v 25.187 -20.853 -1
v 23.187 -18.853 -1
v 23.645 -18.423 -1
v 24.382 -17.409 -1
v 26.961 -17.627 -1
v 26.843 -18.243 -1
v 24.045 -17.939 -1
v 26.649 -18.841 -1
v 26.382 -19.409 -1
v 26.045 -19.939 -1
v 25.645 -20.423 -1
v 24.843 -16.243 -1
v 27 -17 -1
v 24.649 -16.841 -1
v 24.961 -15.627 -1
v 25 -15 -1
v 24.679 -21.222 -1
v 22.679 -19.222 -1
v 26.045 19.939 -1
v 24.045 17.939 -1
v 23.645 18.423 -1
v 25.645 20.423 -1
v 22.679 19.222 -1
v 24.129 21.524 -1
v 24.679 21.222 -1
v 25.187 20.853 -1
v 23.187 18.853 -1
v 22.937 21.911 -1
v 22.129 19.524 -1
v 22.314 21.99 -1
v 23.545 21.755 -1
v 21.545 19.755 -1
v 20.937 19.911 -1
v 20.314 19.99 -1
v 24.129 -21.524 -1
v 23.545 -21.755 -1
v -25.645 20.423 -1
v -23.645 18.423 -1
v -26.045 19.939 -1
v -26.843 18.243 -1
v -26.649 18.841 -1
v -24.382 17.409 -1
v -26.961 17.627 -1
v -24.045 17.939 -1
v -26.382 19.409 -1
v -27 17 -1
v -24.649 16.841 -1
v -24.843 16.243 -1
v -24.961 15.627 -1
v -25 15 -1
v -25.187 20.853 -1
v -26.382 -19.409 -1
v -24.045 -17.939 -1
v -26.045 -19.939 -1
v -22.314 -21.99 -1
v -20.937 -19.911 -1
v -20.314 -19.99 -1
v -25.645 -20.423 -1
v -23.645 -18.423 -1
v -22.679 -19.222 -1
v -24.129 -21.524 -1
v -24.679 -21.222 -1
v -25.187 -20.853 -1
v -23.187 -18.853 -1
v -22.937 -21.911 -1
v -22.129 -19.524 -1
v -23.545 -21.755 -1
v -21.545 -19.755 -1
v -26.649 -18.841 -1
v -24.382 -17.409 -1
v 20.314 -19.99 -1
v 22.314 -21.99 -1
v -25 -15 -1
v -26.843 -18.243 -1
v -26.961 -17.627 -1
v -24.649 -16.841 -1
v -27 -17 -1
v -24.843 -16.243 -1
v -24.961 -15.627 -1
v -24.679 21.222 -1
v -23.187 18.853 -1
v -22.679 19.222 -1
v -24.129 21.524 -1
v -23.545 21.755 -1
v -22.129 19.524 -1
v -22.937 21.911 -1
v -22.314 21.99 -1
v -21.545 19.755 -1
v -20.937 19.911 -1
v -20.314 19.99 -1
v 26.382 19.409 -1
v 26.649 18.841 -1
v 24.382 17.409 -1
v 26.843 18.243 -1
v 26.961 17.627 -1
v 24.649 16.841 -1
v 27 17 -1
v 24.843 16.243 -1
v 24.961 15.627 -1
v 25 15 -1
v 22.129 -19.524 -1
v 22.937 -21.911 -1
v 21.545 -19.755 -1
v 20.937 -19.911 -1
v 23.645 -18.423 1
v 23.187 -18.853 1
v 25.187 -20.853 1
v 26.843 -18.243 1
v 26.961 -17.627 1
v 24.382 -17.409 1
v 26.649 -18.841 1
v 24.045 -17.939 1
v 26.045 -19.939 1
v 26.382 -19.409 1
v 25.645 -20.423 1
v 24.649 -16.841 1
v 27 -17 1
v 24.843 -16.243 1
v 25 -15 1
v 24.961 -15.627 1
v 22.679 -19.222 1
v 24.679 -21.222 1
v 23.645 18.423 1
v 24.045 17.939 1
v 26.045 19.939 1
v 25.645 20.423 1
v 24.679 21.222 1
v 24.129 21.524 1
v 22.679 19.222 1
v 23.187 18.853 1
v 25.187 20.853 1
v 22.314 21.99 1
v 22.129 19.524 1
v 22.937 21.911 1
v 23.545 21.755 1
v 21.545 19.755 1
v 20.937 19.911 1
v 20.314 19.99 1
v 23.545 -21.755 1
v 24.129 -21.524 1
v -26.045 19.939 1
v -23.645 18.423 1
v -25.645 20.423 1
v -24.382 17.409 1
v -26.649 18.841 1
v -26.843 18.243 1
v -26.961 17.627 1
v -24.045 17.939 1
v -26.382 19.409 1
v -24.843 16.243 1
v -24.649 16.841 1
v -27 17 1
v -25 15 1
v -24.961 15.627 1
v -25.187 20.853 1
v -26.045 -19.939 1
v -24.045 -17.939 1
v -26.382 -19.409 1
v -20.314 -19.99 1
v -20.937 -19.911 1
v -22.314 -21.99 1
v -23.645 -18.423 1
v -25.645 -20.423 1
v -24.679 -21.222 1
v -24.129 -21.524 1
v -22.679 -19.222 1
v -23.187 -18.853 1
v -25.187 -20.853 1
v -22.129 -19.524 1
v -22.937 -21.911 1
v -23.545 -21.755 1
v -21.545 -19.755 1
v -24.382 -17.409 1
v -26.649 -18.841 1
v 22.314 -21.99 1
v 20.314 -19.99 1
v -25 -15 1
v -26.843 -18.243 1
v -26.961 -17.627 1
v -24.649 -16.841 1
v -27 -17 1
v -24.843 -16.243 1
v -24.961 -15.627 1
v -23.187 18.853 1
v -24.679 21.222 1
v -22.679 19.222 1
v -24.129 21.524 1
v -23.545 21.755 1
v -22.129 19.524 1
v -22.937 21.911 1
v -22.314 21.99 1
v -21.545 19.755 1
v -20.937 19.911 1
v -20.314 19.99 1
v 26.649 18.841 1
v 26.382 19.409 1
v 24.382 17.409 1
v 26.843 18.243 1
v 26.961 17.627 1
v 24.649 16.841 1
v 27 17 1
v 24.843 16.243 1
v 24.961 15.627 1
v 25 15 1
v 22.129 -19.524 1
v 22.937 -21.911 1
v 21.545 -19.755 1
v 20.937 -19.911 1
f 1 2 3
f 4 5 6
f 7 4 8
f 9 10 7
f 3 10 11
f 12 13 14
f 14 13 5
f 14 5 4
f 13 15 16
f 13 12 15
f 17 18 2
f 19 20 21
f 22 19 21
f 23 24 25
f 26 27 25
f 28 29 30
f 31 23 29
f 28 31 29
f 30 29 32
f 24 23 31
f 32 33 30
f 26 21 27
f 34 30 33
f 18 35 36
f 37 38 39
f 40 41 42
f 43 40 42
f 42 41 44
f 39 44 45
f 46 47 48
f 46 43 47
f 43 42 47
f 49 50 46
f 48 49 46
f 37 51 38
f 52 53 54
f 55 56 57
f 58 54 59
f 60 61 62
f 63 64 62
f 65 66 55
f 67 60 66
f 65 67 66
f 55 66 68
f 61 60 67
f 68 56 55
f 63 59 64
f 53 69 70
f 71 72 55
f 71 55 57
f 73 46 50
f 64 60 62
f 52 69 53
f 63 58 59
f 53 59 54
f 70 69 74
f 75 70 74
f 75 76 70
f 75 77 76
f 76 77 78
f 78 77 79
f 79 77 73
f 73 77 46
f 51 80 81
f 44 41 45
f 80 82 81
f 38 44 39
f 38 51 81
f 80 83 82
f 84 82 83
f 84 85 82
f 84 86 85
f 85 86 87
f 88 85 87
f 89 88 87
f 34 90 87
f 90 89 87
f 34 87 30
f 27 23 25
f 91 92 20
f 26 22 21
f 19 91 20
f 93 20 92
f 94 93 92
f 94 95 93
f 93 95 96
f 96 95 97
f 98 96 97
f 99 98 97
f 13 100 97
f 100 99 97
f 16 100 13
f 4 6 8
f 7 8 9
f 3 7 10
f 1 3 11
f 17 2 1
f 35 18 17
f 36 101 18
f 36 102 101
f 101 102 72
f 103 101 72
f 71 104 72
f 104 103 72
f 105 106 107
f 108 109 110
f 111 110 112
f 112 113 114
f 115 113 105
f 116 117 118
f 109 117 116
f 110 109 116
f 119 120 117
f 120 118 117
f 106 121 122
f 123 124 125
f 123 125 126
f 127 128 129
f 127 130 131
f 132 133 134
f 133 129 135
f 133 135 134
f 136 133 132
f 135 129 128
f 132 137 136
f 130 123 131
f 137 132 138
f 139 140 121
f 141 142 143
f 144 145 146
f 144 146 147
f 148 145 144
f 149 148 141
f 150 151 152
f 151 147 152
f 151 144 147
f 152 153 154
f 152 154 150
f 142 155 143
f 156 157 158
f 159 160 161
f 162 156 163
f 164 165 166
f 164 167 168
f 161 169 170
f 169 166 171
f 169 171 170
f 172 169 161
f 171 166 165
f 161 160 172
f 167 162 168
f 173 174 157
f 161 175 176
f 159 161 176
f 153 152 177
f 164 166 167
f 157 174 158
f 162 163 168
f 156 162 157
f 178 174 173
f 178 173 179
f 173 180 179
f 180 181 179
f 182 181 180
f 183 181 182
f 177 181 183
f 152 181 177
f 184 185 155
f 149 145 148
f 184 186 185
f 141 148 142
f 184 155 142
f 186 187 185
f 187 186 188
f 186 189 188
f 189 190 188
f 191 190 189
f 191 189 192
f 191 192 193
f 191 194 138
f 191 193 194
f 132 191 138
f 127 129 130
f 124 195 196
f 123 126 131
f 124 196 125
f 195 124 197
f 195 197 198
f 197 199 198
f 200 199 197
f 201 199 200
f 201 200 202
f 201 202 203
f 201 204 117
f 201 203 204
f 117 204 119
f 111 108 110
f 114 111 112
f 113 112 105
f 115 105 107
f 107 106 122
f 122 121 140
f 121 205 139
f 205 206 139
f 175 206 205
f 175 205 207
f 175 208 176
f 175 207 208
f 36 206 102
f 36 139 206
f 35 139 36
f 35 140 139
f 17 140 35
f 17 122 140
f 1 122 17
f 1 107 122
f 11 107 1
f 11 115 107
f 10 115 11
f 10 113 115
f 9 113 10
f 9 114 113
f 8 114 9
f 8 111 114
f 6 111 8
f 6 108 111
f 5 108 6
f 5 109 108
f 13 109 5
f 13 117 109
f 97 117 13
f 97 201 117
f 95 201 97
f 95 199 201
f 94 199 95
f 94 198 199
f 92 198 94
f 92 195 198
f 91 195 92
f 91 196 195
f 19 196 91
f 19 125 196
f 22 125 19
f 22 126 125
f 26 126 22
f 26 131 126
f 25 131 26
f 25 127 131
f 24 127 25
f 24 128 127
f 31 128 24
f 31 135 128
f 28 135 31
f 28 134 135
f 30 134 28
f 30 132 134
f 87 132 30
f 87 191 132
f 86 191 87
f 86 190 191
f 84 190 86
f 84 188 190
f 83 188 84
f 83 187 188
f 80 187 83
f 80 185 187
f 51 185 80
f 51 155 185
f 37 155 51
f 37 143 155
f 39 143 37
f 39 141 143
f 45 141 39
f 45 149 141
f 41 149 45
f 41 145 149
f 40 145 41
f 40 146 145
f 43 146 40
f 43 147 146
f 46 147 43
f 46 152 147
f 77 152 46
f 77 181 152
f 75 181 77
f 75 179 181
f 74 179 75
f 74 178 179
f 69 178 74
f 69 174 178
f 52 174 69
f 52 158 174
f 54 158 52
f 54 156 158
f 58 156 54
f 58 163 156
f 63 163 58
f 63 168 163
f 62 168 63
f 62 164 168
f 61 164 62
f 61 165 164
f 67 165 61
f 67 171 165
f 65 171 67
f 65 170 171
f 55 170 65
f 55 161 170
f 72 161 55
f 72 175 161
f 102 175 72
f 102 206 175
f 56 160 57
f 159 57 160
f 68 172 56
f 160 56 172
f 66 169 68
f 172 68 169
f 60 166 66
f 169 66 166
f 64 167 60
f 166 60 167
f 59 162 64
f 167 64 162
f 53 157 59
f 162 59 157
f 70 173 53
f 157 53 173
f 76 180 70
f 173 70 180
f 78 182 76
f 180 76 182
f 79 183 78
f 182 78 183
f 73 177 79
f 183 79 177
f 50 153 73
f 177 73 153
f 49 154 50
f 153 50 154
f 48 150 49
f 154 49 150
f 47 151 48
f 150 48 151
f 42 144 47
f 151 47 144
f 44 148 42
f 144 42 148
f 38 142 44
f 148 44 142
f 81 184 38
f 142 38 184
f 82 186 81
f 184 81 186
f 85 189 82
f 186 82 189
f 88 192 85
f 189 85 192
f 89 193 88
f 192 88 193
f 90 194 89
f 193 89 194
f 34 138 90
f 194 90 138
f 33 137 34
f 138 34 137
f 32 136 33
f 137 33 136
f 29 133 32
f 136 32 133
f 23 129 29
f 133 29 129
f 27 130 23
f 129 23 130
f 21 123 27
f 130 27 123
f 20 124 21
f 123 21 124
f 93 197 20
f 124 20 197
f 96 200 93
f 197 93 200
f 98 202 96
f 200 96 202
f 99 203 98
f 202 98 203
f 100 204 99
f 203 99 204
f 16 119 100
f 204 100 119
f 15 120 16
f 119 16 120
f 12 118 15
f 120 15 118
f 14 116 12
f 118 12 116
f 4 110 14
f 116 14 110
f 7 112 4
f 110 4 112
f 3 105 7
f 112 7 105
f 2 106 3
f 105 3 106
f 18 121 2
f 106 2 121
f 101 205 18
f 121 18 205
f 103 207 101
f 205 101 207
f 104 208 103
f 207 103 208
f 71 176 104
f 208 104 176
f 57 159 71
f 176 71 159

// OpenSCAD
$fn=50;

boxRibTest();

module boxRibTest(){
    boxRib(50, 40, 2, 5);
}

module roundedRectangle(w, h, r){
    minkowski(){
        square([w-2*r, h-2*r], center=true);
        circle(r);
    }
}

module boxRib(w, h, t, r){
    translate([0, 0, -t/2])
        linear_extrude(height = t)
            difference(){
                roundedRectangle(w+2*t, h+2*t, r);
                roundedRectangle(w, h, r);
            }        
}
    
